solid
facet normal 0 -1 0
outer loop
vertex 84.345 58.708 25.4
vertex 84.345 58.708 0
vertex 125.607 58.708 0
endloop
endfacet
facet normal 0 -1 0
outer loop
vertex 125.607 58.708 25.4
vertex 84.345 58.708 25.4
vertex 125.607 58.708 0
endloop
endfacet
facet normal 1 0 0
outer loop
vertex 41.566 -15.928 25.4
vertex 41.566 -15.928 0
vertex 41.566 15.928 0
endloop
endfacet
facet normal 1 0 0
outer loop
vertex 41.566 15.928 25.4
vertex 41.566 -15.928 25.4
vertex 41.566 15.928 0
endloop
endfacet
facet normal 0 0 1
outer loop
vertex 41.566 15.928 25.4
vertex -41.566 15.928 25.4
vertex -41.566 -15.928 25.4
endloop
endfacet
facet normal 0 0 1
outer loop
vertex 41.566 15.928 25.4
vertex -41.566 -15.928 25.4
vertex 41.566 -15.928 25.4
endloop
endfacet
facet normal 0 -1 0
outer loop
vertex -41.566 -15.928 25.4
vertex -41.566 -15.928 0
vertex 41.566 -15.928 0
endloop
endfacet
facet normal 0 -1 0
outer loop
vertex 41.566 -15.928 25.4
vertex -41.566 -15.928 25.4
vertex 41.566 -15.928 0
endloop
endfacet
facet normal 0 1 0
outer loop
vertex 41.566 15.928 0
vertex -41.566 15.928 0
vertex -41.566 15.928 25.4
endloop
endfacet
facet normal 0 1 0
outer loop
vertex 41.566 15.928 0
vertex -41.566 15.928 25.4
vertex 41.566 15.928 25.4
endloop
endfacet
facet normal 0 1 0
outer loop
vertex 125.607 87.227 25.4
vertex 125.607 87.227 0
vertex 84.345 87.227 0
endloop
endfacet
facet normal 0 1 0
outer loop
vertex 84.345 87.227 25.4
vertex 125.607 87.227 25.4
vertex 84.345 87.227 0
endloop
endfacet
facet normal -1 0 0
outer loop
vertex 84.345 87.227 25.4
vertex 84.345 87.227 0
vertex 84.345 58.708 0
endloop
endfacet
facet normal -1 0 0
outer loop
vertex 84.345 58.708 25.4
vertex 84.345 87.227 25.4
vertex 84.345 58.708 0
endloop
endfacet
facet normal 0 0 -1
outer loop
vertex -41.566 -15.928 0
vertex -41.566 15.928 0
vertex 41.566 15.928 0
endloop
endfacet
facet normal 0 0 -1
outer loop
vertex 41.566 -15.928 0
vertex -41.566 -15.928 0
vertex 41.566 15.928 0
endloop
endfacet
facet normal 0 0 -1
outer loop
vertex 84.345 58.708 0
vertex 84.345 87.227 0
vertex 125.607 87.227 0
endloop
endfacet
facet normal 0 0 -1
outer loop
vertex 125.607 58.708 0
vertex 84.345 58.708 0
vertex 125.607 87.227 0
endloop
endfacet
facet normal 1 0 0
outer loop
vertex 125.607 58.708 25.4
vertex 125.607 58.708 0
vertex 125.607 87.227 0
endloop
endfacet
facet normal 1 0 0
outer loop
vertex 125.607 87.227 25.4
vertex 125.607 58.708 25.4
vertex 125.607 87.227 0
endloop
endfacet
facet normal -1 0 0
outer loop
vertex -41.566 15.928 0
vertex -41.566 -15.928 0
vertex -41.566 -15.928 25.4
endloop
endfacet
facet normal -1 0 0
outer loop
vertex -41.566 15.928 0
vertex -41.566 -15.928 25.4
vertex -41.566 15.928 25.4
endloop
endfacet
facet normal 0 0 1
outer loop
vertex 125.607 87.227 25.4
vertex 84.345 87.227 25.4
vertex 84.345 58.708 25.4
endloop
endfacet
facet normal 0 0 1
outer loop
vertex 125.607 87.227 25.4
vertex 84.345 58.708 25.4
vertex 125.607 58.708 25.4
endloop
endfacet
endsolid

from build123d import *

# Parameters (mm, degrees)
F0_W     = 83.131366
F0_H     = 31.85692
F1_DEPTH = 25.4


with BuildPart() as f1:
    # F0 (on Top) → F1 (new body)
    with BuildSketch(Plane.XY):
        Polygon((84.344946, 87.227248), (84.344946, 71.531192), (84.344946, 58.707736), (125.60723, 58.707736), (125.60723, 87.227248), align=None)
        Rectangle(F0_W, F0_H)
    extrude(amount=F1_DEPTH)


solid = f1.part
